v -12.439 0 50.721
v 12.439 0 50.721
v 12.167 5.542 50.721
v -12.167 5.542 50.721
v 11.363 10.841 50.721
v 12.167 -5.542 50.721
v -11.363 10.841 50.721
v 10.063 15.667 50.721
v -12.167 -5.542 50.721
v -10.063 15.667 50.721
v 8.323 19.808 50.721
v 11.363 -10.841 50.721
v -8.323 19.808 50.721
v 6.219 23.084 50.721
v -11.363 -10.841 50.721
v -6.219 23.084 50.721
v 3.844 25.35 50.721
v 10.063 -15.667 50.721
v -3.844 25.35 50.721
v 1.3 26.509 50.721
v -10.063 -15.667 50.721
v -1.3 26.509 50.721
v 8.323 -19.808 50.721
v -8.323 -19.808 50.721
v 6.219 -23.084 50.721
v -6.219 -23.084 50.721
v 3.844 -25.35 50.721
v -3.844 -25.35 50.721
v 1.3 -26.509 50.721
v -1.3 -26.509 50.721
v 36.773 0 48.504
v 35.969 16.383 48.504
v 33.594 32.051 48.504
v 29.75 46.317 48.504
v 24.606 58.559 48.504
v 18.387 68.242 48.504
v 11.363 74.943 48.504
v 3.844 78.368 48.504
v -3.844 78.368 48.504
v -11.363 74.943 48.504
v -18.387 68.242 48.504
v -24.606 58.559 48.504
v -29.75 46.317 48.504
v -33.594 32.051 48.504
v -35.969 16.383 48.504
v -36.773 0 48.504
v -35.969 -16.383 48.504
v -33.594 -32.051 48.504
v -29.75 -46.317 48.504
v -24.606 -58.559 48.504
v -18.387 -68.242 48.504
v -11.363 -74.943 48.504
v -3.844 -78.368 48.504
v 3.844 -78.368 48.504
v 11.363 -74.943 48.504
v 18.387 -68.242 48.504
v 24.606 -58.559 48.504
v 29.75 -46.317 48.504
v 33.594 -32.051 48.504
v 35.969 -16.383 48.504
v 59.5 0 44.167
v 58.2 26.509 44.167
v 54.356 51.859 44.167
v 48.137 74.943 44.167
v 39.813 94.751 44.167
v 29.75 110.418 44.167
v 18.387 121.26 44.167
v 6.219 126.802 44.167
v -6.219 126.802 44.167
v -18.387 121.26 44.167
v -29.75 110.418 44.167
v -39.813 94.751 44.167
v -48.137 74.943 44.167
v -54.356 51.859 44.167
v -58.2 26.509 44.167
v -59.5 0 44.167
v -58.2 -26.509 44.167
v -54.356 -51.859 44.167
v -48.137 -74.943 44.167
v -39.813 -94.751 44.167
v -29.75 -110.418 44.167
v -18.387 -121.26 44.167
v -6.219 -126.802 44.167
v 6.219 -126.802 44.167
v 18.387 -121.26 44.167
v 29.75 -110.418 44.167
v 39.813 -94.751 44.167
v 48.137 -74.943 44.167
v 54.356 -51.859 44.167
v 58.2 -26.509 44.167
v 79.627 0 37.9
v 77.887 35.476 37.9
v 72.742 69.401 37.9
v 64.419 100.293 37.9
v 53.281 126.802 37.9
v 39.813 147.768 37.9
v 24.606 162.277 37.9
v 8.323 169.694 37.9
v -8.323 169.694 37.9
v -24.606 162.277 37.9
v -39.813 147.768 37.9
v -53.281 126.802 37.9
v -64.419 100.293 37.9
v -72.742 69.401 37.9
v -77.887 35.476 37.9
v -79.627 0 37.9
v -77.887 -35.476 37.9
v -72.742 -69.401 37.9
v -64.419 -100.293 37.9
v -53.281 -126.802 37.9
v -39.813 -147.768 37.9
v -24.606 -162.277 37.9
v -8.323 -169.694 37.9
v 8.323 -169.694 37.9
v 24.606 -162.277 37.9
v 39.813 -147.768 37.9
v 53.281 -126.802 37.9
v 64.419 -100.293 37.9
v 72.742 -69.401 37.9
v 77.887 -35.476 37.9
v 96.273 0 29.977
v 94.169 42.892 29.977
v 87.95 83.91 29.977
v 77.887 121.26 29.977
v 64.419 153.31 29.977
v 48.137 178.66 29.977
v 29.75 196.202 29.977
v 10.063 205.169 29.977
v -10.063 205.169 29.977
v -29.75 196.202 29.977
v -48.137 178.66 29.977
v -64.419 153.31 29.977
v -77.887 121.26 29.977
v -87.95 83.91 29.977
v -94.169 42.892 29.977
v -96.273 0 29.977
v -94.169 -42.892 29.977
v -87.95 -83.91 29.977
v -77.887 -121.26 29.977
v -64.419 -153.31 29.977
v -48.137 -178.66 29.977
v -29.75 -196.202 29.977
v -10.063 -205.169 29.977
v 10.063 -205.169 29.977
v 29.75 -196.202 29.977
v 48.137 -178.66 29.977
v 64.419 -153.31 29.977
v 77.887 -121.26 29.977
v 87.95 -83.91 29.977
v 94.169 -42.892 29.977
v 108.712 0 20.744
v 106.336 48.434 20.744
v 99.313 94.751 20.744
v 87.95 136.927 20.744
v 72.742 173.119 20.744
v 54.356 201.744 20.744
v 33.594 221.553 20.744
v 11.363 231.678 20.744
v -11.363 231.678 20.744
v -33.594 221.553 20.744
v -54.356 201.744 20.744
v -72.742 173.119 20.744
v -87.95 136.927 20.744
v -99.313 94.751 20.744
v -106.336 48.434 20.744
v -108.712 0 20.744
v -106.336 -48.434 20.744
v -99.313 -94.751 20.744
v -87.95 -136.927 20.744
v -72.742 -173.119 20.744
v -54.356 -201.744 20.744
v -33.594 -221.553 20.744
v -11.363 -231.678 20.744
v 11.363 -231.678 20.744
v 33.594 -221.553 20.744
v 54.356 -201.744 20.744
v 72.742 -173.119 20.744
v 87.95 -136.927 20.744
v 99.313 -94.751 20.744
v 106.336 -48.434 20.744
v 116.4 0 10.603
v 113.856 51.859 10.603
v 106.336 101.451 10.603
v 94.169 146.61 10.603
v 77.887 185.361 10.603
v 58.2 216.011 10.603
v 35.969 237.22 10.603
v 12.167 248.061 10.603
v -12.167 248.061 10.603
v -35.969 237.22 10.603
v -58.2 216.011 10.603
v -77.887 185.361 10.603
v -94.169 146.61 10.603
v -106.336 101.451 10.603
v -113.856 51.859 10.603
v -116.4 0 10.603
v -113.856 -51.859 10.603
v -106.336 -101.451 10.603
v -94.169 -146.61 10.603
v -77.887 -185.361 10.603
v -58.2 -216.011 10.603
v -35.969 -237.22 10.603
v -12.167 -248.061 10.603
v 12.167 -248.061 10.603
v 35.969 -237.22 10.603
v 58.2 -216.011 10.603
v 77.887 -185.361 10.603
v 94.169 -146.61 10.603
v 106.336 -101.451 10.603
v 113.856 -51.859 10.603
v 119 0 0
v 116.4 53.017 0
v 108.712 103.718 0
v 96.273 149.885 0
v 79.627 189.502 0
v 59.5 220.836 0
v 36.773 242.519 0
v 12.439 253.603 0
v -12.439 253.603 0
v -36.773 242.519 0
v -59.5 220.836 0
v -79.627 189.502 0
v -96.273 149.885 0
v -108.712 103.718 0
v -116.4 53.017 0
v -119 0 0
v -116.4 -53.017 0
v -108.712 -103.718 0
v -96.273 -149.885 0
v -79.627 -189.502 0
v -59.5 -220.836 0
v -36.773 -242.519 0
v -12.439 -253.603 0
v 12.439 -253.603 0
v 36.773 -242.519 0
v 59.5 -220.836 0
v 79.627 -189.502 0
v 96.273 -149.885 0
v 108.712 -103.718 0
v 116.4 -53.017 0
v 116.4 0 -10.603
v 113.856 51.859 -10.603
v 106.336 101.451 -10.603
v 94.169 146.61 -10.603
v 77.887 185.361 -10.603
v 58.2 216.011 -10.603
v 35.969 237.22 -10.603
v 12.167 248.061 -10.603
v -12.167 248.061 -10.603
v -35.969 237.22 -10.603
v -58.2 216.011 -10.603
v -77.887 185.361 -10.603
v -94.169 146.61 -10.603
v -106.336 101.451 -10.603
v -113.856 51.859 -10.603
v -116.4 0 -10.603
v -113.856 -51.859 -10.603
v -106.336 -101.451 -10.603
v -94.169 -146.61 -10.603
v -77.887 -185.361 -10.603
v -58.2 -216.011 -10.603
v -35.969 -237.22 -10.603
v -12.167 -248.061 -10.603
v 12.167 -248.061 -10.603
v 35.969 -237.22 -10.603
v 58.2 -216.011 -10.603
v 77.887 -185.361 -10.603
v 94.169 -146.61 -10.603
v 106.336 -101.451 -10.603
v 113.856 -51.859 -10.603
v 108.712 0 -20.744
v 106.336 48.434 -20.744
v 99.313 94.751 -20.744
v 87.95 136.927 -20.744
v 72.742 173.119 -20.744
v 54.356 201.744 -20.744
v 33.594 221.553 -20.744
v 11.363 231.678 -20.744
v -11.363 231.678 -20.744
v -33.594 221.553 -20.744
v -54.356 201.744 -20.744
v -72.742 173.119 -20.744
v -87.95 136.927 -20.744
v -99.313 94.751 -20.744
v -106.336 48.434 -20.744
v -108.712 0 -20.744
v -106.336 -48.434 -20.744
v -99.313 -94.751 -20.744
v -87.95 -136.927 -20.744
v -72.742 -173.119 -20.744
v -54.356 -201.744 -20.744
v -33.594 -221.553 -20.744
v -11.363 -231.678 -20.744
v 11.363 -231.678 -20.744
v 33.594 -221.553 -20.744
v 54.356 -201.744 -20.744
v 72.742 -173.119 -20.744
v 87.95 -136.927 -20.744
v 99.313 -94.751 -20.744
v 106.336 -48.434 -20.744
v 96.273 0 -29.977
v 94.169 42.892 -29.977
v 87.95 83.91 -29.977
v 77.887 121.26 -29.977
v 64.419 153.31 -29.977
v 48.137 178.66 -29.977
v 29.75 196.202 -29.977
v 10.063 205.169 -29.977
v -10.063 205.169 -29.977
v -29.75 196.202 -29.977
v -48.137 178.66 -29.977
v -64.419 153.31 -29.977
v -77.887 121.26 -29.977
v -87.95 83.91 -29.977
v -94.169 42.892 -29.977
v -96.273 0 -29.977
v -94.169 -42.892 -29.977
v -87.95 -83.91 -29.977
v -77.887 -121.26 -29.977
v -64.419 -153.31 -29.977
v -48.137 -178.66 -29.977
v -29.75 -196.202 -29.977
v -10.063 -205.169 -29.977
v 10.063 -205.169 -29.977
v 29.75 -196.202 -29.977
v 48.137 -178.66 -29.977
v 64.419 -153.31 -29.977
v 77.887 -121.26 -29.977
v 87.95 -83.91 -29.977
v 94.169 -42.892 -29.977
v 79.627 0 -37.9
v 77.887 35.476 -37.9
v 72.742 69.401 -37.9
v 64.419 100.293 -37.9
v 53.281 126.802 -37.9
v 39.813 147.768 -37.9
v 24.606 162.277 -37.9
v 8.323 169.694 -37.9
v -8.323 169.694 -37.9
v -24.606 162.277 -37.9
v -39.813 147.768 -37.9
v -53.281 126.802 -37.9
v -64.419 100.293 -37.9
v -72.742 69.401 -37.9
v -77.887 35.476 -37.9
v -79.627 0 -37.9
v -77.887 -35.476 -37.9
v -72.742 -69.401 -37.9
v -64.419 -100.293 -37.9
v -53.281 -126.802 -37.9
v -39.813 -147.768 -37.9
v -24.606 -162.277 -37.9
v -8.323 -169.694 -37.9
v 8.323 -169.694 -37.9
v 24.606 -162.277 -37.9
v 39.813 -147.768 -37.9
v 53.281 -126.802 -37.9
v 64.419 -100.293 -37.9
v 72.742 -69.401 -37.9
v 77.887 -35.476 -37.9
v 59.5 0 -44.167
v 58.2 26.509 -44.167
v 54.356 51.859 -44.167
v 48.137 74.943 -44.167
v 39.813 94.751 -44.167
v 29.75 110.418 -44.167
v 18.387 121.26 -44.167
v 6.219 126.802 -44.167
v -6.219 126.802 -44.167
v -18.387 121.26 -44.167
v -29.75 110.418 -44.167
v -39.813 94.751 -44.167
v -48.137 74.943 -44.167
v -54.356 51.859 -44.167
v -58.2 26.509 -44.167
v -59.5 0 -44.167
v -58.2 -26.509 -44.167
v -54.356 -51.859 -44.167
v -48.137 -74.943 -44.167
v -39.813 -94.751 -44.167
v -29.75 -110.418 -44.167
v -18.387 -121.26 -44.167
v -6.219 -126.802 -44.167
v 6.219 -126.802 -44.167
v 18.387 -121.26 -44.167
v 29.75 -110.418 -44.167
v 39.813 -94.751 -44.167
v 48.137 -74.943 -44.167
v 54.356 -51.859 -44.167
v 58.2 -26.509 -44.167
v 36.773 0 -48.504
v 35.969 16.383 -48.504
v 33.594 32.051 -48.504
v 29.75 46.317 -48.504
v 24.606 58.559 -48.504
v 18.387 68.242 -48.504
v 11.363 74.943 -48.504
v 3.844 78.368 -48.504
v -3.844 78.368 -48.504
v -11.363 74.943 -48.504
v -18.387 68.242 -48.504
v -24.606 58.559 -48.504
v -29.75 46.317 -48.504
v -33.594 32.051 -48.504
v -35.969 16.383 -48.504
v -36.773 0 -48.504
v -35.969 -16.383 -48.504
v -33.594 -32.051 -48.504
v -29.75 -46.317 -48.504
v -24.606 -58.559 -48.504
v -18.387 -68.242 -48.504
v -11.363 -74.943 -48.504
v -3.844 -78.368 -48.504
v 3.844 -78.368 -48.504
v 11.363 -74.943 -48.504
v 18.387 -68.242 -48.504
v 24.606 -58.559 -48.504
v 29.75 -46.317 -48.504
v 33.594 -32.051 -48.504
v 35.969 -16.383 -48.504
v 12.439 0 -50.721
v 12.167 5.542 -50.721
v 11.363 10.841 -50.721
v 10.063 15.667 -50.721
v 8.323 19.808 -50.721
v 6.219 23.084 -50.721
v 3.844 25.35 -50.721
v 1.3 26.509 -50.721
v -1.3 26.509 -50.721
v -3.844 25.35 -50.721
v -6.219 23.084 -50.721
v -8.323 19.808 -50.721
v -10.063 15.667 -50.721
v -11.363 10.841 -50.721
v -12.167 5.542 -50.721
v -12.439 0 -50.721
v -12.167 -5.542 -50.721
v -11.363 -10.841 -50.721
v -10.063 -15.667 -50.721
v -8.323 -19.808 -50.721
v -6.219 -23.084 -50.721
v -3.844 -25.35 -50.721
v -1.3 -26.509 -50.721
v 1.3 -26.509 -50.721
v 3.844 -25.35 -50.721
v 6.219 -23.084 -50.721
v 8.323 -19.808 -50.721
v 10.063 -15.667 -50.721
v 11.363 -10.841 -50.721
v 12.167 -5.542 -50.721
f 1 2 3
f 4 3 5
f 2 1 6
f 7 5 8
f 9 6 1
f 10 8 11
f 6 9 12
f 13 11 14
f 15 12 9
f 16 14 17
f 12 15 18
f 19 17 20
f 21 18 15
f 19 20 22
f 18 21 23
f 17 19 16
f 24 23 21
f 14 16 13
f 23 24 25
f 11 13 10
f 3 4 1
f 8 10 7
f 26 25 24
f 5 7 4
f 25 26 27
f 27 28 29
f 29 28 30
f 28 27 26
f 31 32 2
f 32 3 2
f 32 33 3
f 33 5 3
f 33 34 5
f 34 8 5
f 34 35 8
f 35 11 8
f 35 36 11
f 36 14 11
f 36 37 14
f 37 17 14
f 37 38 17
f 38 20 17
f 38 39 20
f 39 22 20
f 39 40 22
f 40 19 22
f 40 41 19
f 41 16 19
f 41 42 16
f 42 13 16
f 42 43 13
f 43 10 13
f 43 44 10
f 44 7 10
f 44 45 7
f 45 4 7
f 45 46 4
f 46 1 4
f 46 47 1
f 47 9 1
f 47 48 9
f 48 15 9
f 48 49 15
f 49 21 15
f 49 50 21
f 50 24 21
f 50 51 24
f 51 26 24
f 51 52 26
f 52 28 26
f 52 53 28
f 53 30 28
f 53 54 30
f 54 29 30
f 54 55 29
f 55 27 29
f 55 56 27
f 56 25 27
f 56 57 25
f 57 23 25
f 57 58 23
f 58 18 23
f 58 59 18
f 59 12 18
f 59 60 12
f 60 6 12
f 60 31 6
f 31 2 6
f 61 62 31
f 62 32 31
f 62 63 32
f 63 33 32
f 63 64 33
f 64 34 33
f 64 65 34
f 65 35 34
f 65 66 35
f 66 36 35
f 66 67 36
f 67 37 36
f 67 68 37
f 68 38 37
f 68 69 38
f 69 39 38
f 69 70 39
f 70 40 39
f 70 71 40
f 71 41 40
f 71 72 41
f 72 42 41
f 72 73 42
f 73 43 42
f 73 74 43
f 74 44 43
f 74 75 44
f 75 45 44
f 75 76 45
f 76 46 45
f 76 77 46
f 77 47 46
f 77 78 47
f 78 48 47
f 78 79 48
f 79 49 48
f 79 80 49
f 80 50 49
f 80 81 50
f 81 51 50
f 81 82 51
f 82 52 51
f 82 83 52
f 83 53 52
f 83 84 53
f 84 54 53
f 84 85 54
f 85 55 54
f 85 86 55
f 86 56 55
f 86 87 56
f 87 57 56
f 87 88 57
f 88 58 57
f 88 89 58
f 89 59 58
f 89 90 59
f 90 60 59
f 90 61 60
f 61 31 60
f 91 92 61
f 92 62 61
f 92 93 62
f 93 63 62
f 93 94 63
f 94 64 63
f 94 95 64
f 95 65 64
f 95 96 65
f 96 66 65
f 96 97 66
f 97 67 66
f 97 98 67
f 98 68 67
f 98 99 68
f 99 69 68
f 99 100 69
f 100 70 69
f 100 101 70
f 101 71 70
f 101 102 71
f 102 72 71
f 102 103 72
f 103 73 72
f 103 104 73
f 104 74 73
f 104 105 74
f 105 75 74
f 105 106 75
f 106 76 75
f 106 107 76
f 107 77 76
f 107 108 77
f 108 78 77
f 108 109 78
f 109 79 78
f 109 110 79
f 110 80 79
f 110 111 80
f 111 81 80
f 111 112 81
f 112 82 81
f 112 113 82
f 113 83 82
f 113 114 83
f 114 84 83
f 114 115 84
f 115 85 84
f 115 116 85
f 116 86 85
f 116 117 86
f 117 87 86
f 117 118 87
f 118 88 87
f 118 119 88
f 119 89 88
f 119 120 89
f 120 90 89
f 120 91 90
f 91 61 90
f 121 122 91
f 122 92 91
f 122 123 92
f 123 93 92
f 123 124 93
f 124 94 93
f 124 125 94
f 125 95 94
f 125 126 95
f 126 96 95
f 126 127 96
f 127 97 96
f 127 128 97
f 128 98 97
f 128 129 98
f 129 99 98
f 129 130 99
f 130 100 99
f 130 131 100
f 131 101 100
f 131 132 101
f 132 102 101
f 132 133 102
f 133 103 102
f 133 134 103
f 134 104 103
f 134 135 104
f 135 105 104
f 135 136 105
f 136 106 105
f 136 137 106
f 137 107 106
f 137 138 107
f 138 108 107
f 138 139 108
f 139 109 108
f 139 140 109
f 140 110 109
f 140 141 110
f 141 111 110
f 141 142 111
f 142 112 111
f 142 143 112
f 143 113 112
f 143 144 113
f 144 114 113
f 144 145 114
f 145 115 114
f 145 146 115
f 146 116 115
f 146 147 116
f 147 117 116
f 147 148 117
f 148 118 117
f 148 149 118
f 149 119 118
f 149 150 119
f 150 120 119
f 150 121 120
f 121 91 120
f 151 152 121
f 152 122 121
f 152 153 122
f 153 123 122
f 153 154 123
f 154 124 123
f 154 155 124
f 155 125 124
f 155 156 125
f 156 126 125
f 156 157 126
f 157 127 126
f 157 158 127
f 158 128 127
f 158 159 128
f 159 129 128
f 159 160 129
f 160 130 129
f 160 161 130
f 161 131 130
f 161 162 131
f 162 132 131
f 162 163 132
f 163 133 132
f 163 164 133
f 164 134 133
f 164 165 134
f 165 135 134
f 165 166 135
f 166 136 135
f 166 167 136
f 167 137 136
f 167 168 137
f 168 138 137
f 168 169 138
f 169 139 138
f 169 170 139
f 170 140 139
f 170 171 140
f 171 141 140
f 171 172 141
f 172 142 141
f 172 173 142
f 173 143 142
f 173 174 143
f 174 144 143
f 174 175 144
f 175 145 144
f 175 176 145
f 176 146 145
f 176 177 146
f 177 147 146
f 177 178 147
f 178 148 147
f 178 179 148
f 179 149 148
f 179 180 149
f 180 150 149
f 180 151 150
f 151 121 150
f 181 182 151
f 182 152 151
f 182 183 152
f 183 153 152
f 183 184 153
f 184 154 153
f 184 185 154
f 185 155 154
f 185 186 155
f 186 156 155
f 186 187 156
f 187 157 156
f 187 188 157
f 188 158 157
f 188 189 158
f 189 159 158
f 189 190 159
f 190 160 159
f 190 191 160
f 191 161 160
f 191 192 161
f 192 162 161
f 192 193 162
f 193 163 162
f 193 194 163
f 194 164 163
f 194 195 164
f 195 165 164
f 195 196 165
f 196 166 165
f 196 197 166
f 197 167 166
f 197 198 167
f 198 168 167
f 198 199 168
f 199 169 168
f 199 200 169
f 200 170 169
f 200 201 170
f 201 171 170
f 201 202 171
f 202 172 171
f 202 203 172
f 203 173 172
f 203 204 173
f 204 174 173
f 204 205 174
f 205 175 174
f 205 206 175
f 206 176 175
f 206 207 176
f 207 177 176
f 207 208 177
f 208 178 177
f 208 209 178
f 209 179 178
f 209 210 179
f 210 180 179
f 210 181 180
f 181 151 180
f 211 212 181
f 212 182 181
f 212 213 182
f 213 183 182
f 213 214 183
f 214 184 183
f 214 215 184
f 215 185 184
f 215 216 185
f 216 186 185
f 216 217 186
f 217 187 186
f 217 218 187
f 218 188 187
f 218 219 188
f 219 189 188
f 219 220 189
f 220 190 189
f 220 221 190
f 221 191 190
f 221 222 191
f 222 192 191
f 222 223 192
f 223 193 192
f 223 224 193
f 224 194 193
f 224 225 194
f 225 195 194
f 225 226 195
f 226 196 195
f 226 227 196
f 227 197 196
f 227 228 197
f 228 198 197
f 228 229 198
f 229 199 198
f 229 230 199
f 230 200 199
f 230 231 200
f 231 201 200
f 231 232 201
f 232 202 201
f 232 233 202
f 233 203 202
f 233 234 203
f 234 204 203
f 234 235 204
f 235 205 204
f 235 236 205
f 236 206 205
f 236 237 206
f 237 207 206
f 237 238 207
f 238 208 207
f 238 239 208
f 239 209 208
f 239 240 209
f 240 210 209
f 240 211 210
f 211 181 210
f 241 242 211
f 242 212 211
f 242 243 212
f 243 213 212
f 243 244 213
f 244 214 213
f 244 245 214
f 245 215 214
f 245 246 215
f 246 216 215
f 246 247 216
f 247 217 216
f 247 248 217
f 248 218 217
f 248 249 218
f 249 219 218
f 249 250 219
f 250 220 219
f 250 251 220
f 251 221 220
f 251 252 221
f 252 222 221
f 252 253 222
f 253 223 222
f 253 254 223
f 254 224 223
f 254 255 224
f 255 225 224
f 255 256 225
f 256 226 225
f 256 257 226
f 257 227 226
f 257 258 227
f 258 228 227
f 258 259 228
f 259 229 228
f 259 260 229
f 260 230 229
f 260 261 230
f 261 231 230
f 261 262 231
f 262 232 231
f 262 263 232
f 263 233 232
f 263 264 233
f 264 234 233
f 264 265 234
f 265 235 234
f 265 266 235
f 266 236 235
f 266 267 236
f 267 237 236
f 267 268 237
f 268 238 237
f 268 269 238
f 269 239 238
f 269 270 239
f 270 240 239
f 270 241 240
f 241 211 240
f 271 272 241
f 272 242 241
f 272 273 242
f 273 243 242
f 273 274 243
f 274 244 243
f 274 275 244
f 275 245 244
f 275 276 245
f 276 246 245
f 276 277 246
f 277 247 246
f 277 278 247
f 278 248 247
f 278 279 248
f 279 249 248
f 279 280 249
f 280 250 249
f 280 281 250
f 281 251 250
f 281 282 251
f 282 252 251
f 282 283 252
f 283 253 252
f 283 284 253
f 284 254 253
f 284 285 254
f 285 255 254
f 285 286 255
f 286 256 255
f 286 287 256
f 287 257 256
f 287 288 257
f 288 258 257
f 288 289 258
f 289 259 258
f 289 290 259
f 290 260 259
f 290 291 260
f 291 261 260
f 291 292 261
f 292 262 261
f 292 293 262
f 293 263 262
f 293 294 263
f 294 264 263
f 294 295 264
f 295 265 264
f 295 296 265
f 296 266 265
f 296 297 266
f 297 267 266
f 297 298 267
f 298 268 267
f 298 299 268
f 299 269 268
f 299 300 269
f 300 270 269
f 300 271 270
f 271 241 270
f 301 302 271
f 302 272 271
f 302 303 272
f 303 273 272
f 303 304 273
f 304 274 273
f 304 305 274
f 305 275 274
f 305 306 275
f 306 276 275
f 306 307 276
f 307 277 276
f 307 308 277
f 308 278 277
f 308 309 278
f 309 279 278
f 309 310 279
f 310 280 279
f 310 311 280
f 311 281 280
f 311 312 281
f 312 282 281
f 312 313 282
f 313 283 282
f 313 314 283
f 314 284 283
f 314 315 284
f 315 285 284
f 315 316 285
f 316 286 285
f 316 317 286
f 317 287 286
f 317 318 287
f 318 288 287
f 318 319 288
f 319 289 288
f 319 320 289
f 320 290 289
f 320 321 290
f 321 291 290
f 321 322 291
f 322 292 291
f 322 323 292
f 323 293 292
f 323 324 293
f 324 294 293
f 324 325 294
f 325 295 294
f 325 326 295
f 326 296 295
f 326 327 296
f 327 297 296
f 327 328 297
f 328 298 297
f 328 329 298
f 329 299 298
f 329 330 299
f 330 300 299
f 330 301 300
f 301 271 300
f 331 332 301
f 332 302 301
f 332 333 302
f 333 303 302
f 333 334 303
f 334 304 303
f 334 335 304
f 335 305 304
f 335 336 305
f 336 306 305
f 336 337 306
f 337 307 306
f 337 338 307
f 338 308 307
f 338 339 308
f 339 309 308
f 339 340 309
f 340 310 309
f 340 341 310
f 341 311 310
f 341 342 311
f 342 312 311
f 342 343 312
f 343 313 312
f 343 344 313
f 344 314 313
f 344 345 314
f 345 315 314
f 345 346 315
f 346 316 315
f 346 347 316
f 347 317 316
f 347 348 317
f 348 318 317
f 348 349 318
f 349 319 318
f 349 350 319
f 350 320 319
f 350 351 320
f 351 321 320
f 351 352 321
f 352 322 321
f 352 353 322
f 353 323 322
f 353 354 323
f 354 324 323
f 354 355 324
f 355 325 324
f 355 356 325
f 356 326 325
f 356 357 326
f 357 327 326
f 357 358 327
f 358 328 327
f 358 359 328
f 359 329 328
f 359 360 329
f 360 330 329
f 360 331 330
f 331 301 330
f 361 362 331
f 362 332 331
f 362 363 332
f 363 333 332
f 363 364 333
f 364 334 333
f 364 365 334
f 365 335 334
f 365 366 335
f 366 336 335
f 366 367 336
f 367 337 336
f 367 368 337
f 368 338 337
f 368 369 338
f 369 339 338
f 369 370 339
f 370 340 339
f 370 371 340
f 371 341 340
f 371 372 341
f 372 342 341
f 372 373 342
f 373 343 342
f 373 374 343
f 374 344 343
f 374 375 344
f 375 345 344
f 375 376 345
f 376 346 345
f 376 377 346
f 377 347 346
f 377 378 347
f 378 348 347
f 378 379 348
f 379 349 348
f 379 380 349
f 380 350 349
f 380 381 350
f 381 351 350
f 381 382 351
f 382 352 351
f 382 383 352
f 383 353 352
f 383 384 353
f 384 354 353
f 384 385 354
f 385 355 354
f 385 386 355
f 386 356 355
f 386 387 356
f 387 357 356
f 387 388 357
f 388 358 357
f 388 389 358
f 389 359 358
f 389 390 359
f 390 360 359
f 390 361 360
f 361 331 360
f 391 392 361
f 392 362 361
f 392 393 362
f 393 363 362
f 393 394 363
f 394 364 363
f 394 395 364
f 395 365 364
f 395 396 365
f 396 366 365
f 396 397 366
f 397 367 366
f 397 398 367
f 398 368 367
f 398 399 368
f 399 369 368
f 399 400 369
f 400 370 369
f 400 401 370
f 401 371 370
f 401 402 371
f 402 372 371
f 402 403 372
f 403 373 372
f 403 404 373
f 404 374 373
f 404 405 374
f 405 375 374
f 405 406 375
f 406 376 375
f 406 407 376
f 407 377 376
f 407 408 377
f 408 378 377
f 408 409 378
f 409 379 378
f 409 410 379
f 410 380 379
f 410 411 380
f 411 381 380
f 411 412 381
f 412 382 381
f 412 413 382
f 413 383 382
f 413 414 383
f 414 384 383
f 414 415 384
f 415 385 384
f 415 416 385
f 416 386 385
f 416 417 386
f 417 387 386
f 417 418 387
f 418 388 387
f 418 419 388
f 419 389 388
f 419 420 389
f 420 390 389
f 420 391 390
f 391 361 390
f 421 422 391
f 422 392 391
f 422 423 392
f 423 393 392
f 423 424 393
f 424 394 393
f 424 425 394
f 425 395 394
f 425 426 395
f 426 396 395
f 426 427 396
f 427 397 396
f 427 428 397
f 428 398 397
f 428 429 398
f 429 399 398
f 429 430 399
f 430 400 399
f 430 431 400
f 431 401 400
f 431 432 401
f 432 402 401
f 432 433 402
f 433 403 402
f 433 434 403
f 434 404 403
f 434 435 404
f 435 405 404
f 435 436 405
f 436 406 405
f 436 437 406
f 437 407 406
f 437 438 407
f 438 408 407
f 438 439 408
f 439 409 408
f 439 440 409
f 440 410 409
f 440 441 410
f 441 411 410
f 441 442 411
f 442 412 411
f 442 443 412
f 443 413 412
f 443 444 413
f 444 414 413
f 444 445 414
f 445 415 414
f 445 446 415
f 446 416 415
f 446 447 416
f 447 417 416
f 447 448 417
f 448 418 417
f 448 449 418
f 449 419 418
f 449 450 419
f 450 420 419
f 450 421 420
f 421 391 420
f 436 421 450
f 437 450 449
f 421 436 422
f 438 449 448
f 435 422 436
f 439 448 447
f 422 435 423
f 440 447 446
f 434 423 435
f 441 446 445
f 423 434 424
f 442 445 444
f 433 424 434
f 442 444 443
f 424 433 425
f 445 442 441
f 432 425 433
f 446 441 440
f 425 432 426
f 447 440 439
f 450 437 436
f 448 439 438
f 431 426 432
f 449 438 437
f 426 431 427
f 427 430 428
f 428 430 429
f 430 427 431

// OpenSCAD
// Generated by SolidPython 1.0.1 on 2020-07-29 00:46:48


scale(v = [7, 15, 3]) {
	sphere(r = 17);
}
/***********************************************
*********      SolidPython code:      **********
************************************************
 
# import packages: SolidPython
from solid import *
from solid.utils import *
from itertools import chain, combinations, permutations


class Resize:

    def __init__(self, scad_file):
        self.scad_file = scad_file
        #self.scad_file = import_scad(scad_file)
        # cone/cylinder param:
        self.r1 = 0
        self.r2 = 0
        self.h = 0
        # rectangular prism param:
        self.w = 0
        self.l = 0
        # ellipse param:
        self.r = 0

    # import OpenScad code (file name corresponds to shape)


    # classify shape + parameters
    def assign(self, param1, param2, param3):
        if self.scad_file == 'cone.scad':
            self.r1 = param1
            self.r2 = param2
            self.h = param3
        elif self.scad_file == 'cylinder.scad':
            self.r1 = param1
            self.r2 = param2
            self.h = param3
        elif self.scad_file == 'rectangularPrism.scad':
            self.h = param1
            self.l = param2
            self.w = param3
        else:
            self.r = param1
            self.h = param2

    # resize parameters
    def iterate(self):
        x = range(3, 20, 2)
        i = 1
        if self.scad_file == 'cone.scad':
            tempList = list(permutations(x, 2))
            for temp in tempList:
                param1 = temp[0]
                param2 = temp[1]
                filepath = 'produced_scad_files/' + 'cone' + str(param1) + '_' + str(param2) + '_' + '.scad'
                scad_render_to_file(cylinder(h=param1, r1=param2, r2=0), filepath)

        elif self.scad_file == 'cylinder.scad':
            tempList = list(permutations(x, 3))
            for temp in tempList:
                param1 = temp[0]
                param2 = temp[1]
                filepath = 'produced_scad_files/' + 'cylinder' + str(param1) + '_' + str(param2) + '_' + '.scad'
                scad_render_to_file(cylinder(h=param1, r1=param2, r2=param2), filepath)

        elif self.scad_file == 'rectangularPrism.scad':
            tempList = list(permutations(x, 3))
            for temp in tempList:
                param1 = temp[0]
                param2 = temp[1]
                param3 = temp[2]
                filepath = 'produced_scad_files/' + 'rectangularPrism' + str(param1) + '_' + str(param2) + '_' + str(
                    param3) + '.scad'
                scad_render_to_file(cube(size=(param1, param2, param3)), filepath)

        elif self.scad_file == 'ellipse.scad':
            tempList = list(permutations(x, 4))
            for temp in tempList:
                param1 = temp[0]
                param2 = temp[1]
                param3 = temp[2]
                param4 = temp[3]
                filepath = 'produced_scad_files/' + 'ellipse' + str(param1) + '_' + str(param2) + '_' + str(param3) + '_' + str(param4) + '.scad'
                scad_render_to_file(scale([param1, param2, param3])(sphere(r=param4)), filepath)

    def render_to_scadfile(self):
        scad_render_to_file(scad, 'example.scad') 
 
************************************************/
